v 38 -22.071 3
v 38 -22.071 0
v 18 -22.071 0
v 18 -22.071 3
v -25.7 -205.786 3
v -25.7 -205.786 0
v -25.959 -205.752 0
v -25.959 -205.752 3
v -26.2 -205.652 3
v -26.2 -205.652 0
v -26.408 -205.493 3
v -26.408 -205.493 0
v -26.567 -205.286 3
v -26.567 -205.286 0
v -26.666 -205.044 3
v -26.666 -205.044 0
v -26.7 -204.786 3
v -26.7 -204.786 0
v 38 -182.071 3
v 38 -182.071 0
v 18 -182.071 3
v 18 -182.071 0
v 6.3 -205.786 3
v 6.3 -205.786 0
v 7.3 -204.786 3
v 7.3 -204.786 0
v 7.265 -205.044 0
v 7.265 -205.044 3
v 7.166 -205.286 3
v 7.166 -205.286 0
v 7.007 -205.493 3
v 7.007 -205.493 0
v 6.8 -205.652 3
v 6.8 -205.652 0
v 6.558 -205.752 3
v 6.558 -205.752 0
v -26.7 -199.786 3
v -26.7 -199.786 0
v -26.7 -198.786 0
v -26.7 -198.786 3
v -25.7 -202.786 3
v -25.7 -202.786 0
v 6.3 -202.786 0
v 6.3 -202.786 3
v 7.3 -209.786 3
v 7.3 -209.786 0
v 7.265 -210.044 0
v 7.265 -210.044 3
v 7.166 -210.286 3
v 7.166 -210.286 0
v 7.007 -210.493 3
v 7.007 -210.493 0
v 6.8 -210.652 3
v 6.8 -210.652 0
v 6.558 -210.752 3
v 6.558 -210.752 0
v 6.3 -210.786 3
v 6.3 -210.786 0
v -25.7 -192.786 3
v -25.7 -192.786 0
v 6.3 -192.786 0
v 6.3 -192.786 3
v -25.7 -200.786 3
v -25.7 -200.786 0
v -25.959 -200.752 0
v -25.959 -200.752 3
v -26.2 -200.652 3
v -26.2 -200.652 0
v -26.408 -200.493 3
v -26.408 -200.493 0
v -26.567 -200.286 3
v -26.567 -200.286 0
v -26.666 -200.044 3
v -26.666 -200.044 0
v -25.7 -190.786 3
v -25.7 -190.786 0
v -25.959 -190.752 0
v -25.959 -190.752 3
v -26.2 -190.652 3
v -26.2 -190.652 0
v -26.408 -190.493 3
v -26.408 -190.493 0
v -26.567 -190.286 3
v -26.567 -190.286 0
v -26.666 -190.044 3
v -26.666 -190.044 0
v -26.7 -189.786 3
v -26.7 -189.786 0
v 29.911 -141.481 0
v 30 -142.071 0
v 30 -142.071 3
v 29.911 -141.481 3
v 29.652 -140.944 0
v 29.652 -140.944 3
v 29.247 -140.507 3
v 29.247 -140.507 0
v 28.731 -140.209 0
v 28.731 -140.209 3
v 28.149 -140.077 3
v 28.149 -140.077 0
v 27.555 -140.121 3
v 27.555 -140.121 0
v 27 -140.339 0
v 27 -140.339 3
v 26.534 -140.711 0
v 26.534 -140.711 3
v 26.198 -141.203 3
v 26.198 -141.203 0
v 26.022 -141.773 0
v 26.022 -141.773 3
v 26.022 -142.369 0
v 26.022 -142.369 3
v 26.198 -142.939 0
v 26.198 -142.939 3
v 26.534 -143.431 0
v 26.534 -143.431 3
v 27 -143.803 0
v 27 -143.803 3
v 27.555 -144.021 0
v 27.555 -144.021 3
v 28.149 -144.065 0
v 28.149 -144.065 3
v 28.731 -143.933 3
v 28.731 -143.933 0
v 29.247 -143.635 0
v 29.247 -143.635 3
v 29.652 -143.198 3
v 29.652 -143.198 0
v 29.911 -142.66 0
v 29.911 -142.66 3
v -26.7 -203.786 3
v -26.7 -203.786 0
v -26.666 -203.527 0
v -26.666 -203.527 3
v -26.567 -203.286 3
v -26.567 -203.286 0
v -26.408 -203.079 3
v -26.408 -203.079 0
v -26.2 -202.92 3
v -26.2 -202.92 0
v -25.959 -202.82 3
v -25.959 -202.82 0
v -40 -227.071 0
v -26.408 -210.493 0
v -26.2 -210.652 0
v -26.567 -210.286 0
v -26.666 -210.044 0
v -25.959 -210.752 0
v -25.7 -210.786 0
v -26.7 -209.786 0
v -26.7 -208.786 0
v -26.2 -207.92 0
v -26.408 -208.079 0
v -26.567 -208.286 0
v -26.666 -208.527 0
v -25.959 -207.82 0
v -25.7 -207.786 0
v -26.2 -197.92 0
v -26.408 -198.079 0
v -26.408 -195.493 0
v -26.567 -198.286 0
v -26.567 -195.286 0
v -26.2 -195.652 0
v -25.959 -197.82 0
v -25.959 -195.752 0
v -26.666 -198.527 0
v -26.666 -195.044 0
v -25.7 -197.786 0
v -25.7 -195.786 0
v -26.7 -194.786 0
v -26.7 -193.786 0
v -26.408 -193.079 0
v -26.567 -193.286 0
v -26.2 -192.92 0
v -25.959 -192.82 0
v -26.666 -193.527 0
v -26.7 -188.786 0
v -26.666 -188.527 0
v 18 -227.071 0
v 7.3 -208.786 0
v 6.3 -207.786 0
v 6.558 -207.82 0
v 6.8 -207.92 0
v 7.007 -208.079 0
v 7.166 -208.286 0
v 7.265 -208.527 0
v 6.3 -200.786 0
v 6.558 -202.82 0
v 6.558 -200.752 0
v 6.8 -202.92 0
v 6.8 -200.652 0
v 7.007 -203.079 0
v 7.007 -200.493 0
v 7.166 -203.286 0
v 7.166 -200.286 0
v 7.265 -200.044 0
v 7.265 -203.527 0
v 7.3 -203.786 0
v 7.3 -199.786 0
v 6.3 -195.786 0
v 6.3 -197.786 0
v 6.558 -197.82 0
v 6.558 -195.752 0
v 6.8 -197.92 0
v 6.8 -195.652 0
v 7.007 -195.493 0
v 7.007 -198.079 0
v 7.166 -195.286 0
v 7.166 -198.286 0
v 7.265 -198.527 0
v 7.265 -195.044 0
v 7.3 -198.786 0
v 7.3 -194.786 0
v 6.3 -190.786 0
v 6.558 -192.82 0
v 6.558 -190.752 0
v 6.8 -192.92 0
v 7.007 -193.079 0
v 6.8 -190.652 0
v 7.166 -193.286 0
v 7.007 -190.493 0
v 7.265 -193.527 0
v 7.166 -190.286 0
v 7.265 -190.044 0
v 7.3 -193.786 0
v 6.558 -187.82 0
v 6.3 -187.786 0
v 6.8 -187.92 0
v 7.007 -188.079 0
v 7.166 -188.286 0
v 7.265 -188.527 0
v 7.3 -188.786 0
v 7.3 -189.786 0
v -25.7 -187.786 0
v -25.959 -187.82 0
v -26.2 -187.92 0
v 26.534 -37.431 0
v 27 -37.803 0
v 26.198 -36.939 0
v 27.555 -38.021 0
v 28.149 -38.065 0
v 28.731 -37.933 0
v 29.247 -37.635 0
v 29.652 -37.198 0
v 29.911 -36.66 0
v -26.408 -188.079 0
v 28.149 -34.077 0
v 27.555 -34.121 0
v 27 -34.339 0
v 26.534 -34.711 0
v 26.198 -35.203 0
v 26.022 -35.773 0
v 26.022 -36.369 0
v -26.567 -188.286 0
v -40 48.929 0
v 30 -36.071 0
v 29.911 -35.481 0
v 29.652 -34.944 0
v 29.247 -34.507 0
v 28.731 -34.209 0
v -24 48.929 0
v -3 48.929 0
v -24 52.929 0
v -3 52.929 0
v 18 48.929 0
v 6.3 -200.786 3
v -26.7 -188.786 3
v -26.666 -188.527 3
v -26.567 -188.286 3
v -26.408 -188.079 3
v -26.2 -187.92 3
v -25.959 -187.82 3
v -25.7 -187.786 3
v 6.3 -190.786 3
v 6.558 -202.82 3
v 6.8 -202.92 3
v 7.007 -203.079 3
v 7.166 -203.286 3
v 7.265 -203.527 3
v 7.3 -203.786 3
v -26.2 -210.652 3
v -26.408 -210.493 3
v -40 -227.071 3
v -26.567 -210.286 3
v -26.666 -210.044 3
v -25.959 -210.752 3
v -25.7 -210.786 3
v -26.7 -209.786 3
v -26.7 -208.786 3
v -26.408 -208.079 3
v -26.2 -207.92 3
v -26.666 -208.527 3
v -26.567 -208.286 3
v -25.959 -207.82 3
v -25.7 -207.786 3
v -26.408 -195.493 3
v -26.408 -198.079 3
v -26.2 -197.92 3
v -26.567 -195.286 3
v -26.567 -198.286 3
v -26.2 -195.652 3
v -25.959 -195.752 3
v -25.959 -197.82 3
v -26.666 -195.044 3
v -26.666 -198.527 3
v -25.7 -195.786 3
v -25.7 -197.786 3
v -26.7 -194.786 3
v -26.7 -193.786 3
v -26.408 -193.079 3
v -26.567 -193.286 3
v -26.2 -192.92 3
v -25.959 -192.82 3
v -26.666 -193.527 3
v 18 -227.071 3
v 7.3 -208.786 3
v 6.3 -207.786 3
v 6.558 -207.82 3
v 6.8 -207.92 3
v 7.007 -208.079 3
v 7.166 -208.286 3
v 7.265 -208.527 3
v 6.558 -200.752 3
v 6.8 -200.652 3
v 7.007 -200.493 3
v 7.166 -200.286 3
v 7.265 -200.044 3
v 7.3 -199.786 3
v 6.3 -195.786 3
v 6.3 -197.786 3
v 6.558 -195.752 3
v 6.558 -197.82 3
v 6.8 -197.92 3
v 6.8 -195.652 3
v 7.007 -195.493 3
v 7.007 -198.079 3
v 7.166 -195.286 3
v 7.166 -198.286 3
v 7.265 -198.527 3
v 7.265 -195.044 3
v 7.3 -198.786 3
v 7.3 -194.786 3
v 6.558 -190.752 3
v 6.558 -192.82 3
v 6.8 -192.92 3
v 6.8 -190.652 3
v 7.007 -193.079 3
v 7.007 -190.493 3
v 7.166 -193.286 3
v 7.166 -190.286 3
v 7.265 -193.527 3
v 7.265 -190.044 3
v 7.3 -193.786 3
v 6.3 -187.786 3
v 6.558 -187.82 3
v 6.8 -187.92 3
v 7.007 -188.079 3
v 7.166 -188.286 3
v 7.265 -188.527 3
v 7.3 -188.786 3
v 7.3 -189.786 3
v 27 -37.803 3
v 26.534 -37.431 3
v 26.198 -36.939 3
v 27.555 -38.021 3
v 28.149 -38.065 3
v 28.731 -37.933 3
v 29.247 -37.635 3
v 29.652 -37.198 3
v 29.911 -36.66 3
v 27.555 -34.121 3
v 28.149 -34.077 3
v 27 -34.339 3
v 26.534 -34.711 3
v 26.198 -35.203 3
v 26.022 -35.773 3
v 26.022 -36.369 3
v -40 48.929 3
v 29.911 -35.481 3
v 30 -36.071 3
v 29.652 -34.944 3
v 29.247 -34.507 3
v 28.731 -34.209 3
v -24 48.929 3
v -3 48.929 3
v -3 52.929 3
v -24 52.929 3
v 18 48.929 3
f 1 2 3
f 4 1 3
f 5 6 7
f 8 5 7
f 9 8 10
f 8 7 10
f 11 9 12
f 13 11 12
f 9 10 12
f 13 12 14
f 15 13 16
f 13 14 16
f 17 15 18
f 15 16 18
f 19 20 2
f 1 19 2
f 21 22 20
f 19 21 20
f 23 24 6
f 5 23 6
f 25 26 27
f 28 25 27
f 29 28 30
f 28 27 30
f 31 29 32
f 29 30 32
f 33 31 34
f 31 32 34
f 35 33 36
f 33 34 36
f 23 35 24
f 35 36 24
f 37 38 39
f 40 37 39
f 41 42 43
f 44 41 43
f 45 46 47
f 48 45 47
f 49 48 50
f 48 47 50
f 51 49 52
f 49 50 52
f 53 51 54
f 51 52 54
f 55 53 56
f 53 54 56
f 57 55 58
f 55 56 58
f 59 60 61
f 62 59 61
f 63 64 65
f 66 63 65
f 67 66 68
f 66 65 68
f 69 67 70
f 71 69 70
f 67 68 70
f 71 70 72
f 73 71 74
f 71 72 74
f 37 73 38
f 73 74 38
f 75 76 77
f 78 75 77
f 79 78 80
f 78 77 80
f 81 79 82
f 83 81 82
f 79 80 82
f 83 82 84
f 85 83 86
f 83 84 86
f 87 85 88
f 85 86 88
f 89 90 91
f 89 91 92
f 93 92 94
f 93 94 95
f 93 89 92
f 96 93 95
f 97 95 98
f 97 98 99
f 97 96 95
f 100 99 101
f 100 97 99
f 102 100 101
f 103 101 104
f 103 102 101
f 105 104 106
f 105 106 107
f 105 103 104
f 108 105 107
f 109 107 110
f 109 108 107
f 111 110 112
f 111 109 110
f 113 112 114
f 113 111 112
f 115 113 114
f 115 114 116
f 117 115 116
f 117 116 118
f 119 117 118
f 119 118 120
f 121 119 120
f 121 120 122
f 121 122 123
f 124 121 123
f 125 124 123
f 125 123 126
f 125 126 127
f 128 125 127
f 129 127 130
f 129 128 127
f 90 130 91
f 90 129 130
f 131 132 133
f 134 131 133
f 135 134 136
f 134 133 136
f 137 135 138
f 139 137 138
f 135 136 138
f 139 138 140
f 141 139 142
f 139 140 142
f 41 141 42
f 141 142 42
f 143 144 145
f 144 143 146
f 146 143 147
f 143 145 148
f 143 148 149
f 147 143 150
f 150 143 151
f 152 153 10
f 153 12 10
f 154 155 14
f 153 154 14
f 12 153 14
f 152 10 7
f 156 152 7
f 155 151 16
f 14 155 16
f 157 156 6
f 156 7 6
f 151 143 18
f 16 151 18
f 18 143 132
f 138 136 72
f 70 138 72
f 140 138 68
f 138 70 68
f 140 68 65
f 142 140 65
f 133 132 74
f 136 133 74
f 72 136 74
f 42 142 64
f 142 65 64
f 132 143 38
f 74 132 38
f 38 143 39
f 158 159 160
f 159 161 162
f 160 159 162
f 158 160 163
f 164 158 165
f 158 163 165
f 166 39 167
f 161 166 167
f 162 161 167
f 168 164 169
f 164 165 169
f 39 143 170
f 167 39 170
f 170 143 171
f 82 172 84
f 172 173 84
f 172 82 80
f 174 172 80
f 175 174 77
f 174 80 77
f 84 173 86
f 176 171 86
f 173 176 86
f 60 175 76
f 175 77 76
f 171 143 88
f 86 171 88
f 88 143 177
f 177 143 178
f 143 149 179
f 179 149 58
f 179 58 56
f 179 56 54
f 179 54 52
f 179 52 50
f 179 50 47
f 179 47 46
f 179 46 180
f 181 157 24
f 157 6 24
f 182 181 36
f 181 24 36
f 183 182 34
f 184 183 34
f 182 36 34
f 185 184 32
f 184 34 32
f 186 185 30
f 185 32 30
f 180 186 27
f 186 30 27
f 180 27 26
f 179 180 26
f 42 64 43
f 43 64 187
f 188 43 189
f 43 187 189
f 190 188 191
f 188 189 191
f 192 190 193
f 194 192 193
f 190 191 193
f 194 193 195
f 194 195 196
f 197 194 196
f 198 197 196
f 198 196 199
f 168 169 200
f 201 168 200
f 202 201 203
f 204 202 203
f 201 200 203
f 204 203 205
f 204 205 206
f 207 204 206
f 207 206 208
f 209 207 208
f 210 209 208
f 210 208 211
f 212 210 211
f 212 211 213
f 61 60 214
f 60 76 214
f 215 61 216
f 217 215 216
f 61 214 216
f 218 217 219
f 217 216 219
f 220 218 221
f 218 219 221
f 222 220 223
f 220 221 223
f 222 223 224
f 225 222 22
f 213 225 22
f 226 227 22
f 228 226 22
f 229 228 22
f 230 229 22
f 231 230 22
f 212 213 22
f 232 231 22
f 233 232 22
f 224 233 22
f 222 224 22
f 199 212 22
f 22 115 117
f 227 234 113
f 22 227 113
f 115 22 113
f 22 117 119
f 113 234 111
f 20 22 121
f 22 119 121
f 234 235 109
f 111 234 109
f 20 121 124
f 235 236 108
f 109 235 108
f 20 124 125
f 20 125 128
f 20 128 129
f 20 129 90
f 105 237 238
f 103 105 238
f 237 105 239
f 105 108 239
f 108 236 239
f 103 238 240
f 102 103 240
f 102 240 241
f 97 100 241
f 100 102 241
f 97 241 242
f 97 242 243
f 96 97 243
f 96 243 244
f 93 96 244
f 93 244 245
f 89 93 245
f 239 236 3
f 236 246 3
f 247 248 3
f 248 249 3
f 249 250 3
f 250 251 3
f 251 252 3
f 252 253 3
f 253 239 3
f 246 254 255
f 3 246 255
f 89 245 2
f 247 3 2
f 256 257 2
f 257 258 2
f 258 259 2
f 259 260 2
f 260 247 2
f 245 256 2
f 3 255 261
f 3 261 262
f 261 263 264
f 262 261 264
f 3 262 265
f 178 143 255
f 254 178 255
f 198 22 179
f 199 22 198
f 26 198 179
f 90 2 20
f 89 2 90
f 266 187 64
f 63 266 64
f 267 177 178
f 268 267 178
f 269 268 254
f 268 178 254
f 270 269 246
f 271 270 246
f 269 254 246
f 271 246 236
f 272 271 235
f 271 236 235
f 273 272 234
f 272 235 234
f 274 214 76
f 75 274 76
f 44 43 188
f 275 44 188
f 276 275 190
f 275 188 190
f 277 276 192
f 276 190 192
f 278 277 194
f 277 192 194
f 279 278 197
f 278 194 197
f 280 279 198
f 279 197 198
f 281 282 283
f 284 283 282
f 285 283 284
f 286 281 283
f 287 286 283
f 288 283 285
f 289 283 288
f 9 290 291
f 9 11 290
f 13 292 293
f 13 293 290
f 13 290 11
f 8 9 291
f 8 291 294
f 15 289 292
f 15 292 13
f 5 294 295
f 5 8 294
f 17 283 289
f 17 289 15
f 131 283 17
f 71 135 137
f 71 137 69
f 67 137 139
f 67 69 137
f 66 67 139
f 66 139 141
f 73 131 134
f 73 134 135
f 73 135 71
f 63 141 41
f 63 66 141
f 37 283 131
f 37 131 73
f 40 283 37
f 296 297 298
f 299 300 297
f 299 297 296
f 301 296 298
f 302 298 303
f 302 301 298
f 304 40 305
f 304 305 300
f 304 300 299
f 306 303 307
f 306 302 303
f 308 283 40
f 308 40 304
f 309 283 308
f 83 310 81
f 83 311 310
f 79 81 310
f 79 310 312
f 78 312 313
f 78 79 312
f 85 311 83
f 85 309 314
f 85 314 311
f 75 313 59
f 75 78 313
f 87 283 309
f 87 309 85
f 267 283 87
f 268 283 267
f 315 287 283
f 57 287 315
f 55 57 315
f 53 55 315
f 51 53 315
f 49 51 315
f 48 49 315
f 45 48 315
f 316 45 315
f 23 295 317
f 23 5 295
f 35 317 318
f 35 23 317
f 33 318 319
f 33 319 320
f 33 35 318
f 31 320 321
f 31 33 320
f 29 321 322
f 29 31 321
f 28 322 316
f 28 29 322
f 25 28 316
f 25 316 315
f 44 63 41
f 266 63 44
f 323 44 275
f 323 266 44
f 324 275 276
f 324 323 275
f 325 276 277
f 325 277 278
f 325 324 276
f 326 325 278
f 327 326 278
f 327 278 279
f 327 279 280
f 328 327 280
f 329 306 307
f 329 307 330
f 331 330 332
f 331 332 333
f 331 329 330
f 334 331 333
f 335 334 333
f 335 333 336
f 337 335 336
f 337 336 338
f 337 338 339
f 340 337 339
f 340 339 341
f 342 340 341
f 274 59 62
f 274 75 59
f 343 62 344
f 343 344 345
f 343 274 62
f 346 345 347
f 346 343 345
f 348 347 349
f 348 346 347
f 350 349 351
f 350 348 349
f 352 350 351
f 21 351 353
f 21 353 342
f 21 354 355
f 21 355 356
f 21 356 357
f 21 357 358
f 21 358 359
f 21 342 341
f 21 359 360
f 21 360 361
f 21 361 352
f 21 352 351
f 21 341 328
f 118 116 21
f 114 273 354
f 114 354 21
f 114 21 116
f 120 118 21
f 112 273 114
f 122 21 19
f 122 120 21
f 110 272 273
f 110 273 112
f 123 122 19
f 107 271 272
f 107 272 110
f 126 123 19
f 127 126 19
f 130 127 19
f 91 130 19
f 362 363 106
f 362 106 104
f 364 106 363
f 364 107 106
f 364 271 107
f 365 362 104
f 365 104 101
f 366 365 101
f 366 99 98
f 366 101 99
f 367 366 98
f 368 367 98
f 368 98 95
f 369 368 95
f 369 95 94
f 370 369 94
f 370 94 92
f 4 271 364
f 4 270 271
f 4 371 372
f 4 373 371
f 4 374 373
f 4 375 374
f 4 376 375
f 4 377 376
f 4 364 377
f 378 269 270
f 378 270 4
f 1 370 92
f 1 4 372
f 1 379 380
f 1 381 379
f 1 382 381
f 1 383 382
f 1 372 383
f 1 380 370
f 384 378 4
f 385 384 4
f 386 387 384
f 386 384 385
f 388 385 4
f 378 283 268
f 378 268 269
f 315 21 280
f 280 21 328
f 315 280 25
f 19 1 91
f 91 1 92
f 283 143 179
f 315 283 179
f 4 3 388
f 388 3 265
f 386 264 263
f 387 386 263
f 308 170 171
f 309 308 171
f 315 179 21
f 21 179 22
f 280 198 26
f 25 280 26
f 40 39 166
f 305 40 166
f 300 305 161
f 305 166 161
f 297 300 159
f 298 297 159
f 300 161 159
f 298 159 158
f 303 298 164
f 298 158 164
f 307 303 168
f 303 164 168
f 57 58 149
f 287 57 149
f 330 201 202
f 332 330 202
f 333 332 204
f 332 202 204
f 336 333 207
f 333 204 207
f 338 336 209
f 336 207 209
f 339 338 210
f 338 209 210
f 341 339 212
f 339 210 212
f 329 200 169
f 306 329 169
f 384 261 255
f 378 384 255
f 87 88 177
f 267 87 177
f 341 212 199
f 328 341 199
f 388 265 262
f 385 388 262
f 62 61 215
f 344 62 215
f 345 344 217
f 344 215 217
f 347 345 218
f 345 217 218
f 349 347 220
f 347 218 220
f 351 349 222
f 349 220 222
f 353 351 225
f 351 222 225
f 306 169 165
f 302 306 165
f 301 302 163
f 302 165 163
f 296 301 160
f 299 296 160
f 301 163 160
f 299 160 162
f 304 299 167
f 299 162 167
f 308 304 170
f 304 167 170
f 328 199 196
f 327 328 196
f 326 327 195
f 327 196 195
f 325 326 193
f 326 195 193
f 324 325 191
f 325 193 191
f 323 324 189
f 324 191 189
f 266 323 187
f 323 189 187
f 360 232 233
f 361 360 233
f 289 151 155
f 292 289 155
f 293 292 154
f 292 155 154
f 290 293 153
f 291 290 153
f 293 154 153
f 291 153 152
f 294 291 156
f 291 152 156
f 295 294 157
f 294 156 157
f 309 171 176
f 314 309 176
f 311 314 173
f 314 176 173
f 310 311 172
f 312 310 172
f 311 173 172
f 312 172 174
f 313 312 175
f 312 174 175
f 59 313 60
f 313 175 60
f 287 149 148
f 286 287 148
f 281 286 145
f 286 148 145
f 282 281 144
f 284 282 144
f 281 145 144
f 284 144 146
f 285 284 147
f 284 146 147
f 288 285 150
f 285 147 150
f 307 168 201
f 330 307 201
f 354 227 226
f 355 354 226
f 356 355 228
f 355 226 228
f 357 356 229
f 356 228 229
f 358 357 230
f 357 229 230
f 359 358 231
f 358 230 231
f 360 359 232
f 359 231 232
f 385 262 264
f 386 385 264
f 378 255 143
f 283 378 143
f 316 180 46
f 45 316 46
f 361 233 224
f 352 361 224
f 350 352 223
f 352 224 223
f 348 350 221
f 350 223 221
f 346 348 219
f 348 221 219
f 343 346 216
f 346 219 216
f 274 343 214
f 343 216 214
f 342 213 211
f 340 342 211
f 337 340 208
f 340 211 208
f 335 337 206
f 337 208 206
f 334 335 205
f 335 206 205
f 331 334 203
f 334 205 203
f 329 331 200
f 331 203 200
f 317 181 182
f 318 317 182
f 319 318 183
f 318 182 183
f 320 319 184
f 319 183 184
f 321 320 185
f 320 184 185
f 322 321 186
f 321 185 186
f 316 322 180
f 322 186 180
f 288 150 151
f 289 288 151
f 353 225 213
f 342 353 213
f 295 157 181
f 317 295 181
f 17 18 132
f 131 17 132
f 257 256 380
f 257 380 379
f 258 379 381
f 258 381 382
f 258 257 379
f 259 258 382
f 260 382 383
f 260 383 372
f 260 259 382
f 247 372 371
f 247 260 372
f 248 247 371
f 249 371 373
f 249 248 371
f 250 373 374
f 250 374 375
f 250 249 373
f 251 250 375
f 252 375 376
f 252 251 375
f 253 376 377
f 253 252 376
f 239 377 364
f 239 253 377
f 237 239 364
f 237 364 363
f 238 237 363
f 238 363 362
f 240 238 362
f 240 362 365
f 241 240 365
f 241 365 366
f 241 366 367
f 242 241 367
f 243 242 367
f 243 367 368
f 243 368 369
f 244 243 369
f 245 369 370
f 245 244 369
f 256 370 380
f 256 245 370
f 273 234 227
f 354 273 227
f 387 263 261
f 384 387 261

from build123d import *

# Parameters (mm, degrees)
SKETCH1_R           = 2
BOSS_EXTRUDE1_DEPTH = 3


with BuildPart() as part:
    # Sketch1 → Boss-Extrude1 (new body)
    with BuildSketch(Plane.XY):
        Polygon((18, -22.070954543), (18, 48.929045457), (-3, 48.929045457), (-3, 52.929045457), (-24, 52.929045457), (-24, 48.929045457), (-40, 48.929045457), (-40, -227.070954543), (18, -227.070954543), (18, -182.070954543), (38, -182.070954543), (38, -22.070954543), align=None)
        with Locations((28, -36.070954543)):
            Circle(SKETCH1_R, mode=Mode.SUBTRACT)
        with BuildLine():
            Line((-25.70047512, -207.785634012), (6.29952488, -207.785634012))
            ThreePointArc((6.29952488, -207.785634012), (7.006631662, -208.078527231), (7.29952488, -208.785634012))
            Line((7.29952488, -208.785634012), (7.29952488, -209.785634012))
            ThreePointArc((7.29952488, -209.785634012), (7.006631662, -210.492740793), (6.29952488, -210.785634012))
            Line((6.29952488, -210.785634012), (-25.70047512, -210.785634012))
            ThreePointArc((-25.70047512, -210.785634012), (-26.407581901, -210.492740793), (-26.70047512, -209.785634012))
            Line((-26.70047512, -209.785634012), (-26.70047512, -208.785634012))
            ThreePointArc((-26.70047512, -208.785634012), (-26.407581901, -208.078527231), (-25.70047512, -207.785634012))
        make_face(mode=Mode.SUBTRACT)
        with BuildLine():
            Line((-25.70047512, -202.785634012), (6.29952488, -202.785634012))
            ThreePointArc((6.29952488, -202.785634012), (7.006631662, -203.078527231), (7.29952488, -203.785634012))
            Line((7.29952488, -203.785634012), (7.29952488, -204.785634012))
            ThreePointArc((7.29952488, -204.785634012), (7.006631662, -205.492740793), (6.29952488, -205.785634012))
            Line((6.29952488, -205.785634012), (-25.70047512, -205.785634012))
            ThreePointArc((-25.70047512, -205.785634012), (-26.407581901, -205.492740793), (-26.70047512, -204.785634012))
            Line((-26.70047512, -204.785634012), (-26.70047512, -203.785634012))
            ThreePointArc((-26.70047512, -203.785634012), (-26.407581901, -203.078527231), (-25.70047512, -202.785634012))
        make_face(mode=Mode.SUBTRACT)
        with BuildLine():
            Line((-25.70047512, -197.785634012), (6.29952488, -197.785634012))
            ThreePointArc((6.29952488, -197.785634012), (7.006631662, -198.078527231), (7.29952488, -198.785634012))
            Line((7.29952488, -198.785634012), (7.29952488, -199.785634012))
            ThreePointArc((7.29952488, -199.785634012), (7.006631662, -200.492740793), (6.29952488, -200.785634012))
            Line((6.29952488, -200.785634012), (-25.70047512, -200.785634012))
            ThreePointArc((-25.70047512, -200.785634012), (-26.407581901, -200.492740793), (-26.70047512, -199.785634012))
            Line((-26.70047512, -199.785634012), (-26.70047512, -198.785634012))
            ThreePointArc((-26.70047512, -198.785634012), (-26.407581901, -198.078527231), (-25.70047512, -197.785634012))
        make_face(mode=Mode.SUBTRACT)
        with BuildLine():
            Line((-25.70047512, -192.785634012), (6.29952488, -192.785634012))
            ThreePointArc((6.29952488, -192.785634012), (7.006631662, -193.078527231), (7.29952488, -193.785634012))
            Line((7.29952488, -193.785634012), (7.29952488, -194.785634012))
            ThreePointArc((7.29952488, -194.785634012), (7.006631662, -195.492740793), (6.29952488, -195.785634012))
            Line((6.29952488, -195.785634012), (-25.70047512, -195.785634012))
            ThreePointArc((-25.70047512, -195.785634012), (-26.407581901, -195.492740793), (-26.70047512, -194.785634012))
            Line((-26.70047512, -194.785634012), (-26.70047512, -193.785634012))
            ThreePointArc((-26.70047512, -193.785634012), (-26.407581901, -193.078527231), (-25.70047512, -192.785634012))
        make_face(mode=Mode.SUBTRACT)
        with BuildLine():
            Line((-25.70047512, -187.785634012), (6.29952488, -187.785634012))
            ThreePointArc((6.29952488, -187.785634012), (7.006631662, -188.078527231), (7.29952488, -188.785634012))
            Line((7.29952488, -188.785634012), (7.29952488, -189.785634012))
            ThreePointArc((7.29952488, -189.785634012), (7.006631662, -190.492740793), (6.29952488, -190.785634012))
            Line((6.29952488, -190.785634012), (-25.70047512, -190.785634012))
            ThreePointArc((-25.70047512, -190.785634012), (-26.407581901, -190.492740793), (-26.70047512, -189.785634012))
            Line((-26.70047512, -189.785634012), (-26.70047512, -188.785634012))
            ThreePointArc((-26.70047512, -188.785634012), (-26.407581901, -188.078527231), (-25.70047512, -187.785634012))
        make_face(mode=Mode.SUBTRACT)
        with Locations((28, -142.070954543)):
            Circle(SKETCH1_R, mode=Mode.SUBTRACT)
    extrude(amount=BOSS_EXTRUDE1_DEPTH)


solid = part.part
